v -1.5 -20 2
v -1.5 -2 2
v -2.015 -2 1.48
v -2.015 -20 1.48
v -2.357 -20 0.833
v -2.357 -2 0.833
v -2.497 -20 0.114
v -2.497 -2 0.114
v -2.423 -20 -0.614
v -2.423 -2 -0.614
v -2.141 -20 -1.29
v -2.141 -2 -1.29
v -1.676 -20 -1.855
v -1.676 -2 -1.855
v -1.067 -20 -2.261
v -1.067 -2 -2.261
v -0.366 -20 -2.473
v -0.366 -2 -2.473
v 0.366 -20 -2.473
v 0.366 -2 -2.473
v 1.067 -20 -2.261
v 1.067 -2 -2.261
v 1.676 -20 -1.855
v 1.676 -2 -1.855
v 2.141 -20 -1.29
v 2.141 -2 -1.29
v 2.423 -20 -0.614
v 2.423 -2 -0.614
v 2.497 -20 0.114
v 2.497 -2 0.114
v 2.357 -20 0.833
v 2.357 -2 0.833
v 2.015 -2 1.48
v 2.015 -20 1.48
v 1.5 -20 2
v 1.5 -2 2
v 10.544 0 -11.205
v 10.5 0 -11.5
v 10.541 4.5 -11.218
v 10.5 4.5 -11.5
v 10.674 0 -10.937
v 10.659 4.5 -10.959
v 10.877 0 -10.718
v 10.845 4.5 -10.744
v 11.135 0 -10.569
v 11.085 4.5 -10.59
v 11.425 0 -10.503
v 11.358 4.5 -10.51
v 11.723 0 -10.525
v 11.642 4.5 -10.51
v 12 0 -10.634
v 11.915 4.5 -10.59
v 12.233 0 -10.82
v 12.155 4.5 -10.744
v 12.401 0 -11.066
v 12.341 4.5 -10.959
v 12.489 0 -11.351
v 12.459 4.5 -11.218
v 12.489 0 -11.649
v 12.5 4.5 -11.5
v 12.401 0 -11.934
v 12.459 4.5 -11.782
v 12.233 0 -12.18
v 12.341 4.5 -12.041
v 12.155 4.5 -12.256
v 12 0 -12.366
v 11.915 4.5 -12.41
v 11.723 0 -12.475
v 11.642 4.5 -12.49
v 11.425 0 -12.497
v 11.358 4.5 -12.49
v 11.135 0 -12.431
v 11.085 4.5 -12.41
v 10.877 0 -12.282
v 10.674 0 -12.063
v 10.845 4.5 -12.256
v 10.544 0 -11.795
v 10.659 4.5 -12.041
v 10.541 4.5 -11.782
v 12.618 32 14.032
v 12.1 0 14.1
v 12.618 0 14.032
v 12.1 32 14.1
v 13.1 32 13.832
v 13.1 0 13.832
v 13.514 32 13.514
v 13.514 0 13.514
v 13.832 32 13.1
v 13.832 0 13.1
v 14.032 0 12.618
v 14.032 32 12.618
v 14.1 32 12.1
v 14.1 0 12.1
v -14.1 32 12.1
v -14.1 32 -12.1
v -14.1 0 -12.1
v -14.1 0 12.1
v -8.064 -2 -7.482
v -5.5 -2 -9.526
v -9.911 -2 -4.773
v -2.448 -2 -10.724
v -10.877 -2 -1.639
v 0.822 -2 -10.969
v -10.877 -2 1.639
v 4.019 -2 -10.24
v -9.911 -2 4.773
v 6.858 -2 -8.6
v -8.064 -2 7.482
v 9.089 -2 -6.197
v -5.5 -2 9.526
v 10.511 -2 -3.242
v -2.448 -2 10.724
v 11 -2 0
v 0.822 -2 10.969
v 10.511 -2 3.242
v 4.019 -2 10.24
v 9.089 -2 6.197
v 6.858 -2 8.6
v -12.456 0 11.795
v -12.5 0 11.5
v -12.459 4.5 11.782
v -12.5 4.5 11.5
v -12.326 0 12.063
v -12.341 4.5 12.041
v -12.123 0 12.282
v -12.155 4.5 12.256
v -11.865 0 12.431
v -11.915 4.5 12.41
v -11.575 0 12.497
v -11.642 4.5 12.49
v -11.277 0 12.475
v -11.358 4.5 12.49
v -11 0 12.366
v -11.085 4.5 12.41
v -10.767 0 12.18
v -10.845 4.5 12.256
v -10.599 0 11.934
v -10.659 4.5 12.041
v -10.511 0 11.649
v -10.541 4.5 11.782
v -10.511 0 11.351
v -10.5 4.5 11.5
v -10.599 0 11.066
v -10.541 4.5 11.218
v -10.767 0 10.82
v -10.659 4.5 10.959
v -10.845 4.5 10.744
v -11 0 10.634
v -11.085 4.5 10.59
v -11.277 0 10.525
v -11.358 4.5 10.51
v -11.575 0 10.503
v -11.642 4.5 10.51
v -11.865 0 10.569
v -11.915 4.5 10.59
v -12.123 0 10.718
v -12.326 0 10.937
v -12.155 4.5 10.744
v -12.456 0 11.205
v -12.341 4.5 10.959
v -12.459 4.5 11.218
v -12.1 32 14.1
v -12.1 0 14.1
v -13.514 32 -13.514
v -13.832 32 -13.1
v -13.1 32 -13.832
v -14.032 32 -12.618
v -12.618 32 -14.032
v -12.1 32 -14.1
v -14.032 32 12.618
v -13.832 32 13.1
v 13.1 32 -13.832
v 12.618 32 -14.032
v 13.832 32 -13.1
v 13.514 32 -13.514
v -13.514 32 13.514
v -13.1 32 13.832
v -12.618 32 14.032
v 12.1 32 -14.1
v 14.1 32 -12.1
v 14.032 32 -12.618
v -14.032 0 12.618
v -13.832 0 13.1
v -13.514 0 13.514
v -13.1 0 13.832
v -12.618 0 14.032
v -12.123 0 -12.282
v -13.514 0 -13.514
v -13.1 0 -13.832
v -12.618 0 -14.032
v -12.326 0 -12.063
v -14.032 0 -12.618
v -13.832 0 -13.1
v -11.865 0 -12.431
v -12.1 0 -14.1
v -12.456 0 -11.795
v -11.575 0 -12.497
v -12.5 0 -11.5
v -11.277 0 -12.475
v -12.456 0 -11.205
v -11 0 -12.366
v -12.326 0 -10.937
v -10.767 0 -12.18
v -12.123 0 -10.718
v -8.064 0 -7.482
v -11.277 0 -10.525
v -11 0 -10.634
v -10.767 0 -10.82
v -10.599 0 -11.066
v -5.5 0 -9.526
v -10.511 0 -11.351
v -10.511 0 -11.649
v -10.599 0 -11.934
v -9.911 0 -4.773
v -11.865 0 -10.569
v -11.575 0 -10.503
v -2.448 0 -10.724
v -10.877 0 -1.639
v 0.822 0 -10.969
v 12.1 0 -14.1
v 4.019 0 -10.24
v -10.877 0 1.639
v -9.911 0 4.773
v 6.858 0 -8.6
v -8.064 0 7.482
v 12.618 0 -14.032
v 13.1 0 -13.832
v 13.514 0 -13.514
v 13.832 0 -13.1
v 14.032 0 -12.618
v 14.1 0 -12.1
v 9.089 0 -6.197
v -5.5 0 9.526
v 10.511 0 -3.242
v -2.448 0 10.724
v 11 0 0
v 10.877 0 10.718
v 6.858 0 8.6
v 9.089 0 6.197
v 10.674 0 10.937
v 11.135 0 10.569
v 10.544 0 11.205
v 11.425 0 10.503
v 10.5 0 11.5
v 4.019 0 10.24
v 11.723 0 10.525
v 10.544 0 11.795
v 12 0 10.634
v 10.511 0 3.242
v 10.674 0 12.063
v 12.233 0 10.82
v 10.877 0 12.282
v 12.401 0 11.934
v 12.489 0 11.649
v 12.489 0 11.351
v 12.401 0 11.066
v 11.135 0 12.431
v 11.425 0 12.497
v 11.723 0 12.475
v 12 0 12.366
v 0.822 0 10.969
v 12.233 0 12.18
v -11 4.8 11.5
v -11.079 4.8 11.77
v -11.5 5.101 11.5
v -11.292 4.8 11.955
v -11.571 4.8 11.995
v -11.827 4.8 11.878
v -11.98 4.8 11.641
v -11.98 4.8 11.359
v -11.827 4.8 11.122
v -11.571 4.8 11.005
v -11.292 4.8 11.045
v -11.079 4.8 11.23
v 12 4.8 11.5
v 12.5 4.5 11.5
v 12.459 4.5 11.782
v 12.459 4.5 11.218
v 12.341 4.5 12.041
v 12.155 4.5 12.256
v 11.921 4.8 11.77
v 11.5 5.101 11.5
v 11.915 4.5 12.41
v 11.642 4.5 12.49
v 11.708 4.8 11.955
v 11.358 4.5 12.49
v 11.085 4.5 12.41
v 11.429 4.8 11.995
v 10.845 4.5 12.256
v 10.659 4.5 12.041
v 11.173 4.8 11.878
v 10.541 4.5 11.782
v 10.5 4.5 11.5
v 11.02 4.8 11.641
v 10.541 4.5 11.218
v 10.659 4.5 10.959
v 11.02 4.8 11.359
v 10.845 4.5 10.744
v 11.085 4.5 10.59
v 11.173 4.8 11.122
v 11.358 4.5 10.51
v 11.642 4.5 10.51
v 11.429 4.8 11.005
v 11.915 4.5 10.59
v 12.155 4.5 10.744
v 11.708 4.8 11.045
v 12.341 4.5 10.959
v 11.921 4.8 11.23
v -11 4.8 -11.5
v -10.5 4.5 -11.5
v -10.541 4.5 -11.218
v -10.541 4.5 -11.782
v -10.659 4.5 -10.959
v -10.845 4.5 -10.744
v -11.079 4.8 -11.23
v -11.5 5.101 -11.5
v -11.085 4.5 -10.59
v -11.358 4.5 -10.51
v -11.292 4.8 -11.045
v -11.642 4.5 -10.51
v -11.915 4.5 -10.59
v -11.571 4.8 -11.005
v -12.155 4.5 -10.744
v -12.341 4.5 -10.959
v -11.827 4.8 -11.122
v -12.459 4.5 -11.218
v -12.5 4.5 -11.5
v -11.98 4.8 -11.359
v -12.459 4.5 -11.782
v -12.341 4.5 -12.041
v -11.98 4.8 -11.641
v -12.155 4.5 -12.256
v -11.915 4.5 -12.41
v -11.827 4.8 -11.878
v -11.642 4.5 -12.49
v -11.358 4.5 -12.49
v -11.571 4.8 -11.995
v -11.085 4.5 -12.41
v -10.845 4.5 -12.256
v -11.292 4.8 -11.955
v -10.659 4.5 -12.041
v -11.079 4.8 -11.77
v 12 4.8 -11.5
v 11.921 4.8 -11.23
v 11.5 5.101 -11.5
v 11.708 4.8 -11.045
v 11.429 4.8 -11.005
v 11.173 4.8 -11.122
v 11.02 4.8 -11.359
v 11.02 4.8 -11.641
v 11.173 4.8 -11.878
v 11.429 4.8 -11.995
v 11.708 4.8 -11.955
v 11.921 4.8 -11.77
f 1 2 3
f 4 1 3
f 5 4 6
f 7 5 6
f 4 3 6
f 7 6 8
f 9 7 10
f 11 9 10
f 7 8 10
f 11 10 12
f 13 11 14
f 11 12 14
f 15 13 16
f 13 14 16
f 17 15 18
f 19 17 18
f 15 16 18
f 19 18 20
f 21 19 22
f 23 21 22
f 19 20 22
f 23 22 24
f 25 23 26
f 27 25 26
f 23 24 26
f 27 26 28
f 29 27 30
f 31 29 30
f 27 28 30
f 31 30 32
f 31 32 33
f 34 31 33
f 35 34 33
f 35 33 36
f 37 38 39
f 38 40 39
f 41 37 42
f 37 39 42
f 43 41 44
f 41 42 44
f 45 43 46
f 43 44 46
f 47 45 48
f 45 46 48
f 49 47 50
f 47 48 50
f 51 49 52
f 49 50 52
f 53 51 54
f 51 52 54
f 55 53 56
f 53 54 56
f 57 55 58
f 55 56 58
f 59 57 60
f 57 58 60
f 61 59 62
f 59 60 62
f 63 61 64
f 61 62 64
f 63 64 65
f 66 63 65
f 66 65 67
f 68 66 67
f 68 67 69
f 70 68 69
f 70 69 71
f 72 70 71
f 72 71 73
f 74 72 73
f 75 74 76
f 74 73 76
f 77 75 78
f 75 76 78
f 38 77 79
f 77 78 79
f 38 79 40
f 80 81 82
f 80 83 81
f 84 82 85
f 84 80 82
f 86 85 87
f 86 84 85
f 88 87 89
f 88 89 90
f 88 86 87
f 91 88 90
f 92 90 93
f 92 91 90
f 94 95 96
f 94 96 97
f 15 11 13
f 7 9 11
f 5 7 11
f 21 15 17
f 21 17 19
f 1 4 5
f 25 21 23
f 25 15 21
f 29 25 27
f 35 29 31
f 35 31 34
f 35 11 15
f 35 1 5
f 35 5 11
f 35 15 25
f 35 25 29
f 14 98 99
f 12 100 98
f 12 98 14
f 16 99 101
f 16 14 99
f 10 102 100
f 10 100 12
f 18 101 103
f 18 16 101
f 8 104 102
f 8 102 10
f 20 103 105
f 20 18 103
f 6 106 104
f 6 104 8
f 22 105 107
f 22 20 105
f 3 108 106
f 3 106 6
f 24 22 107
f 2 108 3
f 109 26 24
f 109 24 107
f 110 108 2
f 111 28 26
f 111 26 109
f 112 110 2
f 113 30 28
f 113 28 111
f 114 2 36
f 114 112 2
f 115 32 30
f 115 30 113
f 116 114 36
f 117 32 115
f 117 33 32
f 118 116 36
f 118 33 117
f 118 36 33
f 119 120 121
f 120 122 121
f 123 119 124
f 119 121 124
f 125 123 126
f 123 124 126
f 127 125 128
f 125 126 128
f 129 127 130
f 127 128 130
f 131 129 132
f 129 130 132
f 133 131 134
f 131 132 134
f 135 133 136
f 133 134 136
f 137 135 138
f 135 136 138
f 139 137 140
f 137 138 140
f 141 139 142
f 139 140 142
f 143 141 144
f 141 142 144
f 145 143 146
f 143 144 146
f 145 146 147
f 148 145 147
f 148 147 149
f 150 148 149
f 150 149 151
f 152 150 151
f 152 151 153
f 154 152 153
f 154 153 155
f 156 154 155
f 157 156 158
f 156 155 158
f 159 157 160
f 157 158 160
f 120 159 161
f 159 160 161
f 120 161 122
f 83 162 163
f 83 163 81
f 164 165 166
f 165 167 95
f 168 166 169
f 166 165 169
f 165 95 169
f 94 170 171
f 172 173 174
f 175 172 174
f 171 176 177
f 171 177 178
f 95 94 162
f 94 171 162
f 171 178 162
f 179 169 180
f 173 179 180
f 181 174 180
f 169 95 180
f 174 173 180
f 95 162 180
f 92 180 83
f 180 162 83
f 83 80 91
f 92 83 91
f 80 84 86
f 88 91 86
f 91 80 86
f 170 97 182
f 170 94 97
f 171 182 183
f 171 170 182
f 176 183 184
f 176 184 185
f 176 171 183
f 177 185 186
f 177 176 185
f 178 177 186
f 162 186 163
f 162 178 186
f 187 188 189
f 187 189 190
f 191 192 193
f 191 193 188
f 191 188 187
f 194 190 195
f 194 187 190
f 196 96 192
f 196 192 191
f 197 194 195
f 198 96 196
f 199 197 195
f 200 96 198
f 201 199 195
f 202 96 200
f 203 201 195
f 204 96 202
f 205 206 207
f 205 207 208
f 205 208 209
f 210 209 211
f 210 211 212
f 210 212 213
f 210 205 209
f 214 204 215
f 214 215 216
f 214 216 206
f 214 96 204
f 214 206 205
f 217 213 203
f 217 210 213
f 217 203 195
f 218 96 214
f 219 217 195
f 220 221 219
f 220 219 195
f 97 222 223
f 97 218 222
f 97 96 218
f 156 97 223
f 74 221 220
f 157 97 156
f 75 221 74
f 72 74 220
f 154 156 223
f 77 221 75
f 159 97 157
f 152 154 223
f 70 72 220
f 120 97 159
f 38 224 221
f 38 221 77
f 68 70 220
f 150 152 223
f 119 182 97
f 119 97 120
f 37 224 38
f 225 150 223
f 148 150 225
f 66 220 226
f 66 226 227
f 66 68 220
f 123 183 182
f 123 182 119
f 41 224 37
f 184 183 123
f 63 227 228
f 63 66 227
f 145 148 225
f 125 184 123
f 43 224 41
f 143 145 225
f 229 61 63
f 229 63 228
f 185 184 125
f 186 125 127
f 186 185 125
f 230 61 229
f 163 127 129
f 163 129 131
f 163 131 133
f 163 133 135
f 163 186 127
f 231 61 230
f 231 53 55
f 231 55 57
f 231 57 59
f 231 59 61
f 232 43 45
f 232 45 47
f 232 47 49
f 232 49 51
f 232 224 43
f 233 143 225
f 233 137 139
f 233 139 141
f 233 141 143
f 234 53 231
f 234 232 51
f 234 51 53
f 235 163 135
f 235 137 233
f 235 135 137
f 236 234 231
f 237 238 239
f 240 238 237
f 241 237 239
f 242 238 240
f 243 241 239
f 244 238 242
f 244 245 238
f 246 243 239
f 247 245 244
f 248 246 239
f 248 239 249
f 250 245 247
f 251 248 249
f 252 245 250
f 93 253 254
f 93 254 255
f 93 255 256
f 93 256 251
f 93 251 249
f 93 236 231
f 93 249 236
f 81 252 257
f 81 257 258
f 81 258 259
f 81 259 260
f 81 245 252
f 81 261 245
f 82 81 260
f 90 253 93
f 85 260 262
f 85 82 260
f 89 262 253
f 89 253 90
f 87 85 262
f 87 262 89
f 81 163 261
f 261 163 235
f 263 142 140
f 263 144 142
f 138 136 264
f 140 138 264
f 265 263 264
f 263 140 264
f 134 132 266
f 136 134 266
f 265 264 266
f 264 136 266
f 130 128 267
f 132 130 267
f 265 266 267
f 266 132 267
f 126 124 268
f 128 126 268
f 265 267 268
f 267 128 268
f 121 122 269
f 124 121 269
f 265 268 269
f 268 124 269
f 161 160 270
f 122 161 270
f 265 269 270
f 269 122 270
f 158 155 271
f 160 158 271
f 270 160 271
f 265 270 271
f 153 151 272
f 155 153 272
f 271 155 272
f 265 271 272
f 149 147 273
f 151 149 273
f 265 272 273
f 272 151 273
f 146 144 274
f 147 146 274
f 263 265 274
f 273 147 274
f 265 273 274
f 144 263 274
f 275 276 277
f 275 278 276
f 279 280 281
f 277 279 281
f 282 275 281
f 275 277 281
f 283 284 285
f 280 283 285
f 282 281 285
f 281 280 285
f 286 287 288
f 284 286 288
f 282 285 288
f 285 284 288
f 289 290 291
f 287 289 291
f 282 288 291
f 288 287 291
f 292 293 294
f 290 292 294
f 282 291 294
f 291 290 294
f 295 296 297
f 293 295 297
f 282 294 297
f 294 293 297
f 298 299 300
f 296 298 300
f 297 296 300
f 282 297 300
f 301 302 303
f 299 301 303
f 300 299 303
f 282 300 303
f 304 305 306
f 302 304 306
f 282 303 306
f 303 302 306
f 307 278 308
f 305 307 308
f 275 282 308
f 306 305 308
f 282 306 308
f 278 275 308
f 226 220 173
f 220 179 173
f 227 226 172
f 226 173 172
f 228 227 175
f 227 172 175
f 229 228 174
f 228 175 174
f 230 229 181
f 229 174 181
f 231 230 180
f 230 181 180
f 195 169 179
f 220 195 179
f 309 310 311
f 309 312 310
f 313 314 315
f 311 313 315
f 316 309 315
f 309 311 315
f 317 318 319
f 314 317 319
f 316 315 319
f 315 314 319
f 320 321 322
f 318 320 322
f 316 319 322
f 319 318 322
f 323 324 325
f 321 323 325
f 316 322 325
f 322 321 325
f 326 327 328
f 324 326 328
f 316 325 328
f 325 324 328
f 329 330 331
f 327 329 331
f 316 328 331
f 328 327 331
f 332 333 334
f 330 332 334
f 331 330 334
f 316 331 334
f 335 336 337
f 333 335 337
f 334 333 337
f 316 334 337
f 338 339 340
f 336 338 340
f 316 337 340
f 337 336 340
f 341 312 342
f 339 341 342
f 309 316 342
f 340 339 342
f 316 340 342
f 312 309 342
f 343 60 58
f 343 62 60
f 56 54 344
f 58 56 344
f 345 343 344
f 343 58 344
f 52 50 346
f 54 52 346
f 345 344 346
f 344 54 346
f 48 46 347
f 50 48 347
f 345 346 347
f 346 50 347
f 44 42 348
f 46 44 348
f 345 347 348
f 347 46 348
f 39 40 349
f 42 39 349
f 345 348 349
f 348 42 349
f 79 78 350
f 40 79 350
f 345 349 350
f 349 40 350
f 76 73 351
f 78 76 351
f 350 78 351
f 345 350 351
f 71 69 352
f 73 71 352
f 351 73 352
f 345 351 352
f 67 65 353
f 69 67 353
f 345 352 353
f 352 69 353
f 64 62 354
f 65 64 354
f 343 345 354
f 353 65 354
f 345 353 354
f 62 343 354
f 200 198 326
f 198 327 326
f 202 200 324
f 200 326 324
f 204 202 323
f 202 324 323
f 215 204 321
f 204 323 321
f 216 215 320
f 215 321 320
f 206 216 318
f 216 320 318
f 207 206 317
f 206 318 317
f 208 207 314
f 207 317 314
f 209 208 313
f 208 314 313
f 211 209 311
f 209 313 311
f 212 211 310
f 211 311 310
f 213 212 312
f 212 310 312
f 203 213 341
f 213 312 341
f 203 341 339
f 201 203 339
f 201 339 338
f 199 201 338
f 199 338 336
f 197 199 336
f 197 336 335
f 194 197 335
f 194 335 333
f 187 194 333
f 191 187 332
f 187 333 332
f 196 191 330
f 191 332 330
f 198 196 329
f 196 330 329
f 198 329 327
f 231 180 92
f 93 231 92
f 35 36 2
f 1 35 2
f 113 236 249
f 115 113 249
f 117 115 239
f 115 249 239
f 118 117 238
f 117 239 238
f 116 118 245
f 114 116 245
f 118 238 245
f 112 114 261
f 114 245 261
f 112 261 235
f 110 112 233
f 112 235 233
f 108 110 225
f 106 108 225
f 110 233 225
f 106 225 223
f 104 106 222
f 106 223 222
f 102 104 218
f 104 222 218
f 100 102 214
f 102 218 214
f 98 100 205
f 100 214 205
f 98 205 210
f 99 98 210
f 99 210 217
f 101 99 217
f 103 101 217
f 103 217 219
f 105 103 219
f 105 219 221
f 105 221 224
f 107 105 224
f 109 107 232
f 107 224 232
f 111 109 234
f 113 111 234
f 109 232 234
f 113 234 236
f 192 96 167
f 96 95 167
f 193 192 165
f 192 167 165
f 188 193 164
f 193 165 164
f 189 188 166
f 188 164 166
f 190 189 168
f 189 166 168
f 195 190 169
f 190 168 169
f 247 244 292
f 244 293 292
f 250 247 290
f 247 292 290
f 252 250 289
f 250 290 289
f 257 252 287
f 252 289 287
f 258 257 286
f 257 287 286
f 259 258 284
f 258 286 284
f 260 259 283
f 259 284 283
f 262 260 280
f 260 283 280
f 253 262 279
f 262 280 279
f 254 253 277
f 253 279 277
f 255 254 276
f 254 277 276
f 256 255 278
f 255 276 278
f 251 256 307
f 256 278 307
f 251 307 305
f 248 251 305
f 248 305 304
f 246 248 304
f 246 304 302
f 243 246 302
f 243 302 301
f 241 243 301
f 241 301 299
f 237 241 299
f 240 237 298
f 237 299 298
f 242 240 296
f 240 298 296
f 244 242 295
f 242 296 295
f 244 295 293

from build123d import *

# Parameters (mm, degrees)
F0_W     = 28.2
F0_H     = 28.2
F1_DEPTH = 32
F2_R     = 11
F3_DEPTH = 2
F5_DEPTH = 18
F7_D     = 2
F7_DEPTH = 4.5
F7_TIP   = 0.600860619
F8_R     = 2


with BuildPart() as f1:
    # F0 (on Front) → F1 (new body)
    with BuildSketch(Plane.XZ):
        Rectangle(F0_W, F0_H)
    extrude(amount=-F1_DEPTH)

    # F2 (on Front) → F3 (join)
    with BuildSketch(Plane.XZ):
        Circle(F2_R)
    extrude(amount=F3_DEPTH)

    # F4 (on face) → F5 (join)
    with BuildSketch(Plane.XZ.offset(2)):
        with BuildLine():
            Line((1.5, 2), (-1.5, 2))
            ThreePointArc((-1.5, 2), (0, -2.5), (1.5, 2))
        make_face()
    extrude(amount=F5_DEPTH)

    # F7
    with Locations(Plane.XZ):
        with Locations((-11.5, 11.5), (11.5, 11.5), (11.5, -11.5), (-11.5, -11.5)):
            Hole(F7_D / 2, depth=F7_DEPTH)
            with Locations((0, 0, -(F7_DEPTH + F7_TIP / 2))):  # 118° drill point
                Cone(0, F7_D / 2, F7_TIP, mode=Mode.SUBTRACT)

    # F8
    f8_edges = [f1.edges().sort_by_distance(p)[0] for p in [
        (14.1, 16, 14.1),
        (14.1, 16, -14.1),
        (-14.1, 16, 14.1),
        (-14.1, 16, -14.1),
    ]]
    fillet(f8_edges, radius=F8_R)


solid = f1.part
